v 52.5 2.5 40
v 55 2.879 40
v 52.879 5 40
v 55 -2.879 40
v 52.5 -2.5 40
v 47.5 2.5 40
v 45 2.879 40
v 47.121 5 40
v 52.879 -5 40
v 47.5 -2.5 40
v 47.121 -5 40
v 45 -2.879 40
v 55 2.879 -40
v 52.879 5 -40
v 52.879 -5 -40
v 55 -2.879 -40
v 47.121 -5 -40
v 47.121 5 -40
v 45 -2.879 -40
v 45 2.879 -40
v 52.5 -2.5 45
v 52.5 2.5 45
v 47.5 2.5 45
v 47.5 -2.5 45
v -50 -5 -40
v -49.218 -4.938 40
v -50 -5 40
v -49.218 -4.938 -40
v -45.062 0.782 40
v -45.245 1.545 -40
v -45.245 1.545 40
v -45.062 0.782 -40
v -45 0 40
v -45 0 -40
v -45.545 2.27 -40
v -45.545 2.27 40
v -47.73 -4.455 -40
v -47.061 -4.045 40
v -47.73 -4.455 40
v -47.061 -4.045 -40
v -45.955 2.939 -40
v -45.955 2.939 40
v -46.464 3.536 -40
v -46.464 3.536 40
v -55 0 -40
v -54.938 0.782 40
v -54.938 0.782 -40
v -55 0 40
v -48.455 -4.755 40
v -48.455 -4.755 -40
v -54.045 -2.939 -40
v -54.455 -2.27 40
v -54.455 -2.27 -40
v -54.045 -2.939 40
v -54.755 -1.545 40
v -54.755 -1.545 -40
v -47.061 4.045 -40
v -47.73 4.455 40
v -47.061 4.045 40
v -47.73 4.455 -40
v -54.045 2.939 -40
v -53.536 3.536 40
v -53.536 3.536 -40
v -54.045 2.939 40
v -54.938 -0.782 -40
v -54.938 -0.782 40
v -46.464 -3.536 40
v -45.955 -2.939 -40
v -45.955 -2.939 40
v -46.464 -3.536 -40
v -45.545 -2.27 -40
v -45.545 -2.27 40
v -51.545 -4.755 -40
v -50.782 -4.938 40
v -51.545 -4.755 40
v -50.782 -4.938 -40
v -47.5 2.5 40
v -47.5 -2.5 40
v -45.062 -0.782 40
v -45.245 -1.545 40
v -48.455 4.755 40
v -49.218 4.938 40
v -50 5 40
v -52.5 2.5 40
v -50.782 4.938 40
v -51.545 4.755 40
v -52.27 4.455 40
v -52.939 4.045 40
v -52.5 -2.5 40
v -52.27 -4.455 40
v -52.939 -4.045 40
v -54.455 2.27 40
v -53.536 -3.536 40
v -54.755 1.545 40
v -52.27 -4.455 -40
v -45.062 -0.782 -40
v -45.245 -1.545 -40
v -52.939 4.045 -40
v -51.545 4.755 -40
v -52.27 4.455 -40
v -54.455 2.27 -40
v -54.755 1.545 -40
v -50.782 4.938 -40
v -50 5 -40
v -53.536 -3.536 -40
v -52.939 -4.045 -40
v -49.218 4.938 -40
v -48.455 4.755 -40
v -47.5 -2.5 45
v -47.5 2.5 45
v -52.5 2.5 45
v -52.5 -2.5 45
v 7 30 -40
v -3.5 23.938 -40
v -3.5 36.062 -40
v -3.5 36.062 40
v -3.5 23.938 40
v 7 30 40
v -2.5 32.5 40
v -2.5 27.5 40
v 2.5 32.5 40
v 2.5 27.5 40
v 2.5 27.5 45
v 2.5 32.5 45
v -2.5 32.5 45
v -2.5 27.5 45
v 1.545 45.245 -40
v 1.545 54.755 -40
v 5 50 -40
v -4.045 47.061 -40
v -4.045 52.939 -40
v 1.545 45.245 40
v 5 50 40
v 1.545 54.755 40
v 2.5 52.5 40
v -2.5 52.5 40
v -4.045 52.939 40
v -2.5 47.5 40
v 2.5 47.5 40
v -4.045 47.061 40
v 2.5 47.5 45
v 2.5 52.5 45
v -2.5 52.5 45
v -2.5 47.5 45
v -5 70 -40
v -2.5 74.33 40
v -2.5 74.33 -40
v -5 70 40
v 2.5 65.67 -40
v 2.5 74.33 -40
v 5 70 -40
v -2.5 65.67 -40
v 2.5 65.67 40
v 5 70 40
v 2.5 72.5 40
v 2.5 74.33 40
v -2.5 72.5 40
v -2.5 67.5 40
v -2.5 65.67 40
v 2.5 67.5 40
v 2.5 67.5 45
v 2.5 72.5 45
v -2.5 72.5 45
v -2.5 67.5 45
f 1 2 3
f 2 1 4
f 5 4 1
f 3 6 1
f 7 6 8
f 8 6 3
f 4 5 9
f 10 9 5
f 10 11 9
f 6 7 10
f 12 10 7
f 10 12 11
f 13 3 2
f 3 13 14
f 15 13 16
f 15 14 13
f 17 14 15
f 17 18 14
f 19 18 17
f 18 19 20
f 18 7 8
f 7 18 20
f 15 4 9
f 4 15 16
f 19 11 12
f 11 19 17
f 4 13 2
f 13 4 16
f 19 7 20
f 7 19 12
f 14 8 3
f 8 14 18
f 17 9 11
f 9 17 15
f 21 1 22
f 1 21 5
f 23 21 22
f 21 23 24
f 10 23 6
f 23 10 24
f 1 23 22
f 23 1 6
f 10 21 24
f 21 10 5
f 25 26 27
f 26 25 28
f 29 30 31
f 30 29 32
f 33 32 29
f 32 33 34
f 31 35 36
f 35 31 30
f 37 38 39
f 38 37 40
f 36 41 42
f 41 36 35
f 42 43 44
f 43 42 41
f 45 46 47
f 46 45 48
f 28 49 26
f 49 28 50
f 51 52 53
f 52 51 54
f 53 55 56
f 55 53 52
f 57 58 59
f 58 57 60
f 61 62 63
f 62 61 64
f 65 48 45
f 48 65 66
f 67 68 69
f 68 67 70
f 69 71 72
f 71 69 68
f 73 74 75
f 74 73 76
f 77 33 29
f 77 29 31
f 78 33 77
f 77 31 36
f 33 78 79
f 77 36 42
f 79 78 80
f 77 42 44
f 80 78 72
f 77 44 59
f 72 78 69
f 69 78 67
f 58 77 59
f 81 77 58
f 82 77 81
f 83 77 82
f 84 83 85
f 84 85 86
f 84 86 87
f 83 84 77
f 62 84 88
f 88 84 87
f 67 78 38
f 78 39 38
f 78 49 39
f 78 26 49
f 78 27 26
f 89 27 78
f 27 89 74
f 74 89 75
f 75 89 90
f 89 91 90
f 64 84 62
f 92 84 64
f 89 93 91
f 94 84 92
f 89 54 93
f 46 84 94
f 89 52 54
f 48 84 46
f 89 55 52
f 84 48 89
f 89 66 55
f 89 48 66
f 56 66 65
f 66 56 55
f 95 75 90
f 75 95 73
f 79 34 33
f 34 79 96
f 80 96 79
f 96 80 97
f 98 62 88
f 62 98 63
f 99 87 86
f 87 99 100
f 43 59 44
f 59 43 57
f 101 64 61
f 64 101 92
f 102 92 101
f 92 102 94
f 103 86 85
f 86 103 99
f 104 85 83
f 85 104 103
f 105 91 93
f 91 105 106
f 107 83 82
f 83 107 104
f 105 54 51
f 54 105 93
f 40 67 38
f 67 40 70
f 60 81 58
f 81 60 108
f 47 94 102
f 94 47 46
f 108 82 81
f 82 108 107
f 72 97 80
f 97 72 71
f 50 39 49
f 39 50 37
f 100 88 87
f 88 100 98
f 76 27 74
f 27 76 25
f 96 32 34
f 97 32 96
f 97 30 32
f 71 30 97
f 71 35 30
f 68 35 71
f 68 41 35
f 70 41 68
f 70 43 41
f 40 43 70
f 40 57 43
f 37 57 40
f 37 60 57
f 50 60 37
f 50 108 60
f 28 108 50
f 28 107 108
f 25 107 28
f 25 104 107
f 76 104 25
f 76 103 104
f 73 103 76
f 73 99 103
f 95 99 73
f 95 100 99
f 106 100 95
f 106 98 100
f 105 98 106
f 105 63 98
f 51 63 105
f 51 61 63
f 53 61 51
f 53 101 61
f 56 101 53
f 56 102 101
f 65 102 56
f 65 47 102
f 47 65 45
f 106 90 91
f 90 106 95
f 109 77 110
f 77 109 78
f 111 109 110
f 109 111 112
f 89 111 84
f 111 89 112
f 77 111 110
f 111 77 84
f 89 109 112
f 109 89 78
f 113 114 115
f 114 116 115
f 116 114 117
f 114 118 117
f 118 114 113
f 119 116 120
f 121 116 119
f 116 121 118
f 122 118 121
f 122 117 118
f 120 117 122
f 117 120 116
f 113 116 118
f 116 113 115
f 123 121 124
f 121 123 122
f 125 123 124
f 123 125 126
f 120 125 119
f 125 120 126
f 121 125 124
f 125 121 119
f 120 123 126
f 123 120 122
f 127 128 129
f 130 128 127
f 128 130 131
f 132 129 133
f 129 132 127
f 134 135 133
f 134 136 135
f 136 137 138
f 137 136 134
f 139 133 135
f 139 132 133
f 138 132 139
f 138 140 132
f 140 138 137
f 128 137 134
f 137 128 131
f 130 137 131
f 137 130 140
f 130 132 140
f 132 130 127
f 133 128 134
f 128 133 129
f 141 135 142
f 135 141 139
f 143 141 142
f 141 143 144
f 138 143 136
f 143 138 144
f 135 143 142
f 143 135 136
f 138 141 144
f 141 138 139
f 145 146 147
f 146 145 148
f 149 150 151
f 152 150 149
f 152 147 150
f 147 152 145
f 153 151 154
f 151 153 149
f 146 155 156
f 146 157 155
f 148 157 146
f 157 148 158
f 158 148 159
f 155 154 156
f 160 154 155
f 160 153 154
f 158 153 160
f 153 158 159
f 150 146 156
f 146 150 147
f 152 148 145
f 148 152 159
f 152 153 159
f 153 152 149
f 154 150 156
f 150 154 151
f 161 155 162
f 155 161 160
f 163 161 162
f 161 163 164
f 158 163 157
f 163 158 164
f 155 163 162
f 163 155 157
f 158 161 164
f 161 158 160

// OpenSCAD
$fn=40;

module cut_corners_shaft(width, length) {
  offset = width / 2;
  difference() {
    cube([width,width,length], center=true);
    union() {
      translate([offset,offset,0]) rotate([0,0,45]) cube([3,3,length], center=true);
      translate([-offset,offset,0]) rotate([0,0,45]) cube([3,3,length], center=true);
      translate([offset,-offset,0]) rotate([0,0,45]) cube([3,3,length], center=true);
      translate([-offset,-offset,0]) rotate([0,0,45]) cube([3,3,length], center=true);
    }
  }
  translate([0,0,2.5+length/2]) cube([5,5,5], center=true);
}

module round_shaft(width, length) {
  cylinder(h=length, d=width, center=true);
  translate([0,0,2.5+length/2]) cube([5,5,5], center=true);
}

module polygon_shaft(width, length, sides) {

  linear_extrude(height = length, center = true)
    circle(width,$fn=sides);
  translate([0,0,2.5+length/2]) cube([5,5,5], center=true);
}


/* linear_extrude(height = 5, center = true, convexity = 10)
  translate([-30,-170,0])
  import(file = "button_profile.dxf", convexity=4); */

/* rotate_extrude(angle = 360, convexity = 2)
translate([-30,-170,0])
import(file = "button_profile.dxf"); */

/*
rotate_extrude(angle = 180, convexity = 3)
rotate([0,0,90])
translate([-10,0,0])
import(file = "button_profile.dxf"); */

translate([50,0,0]) cut_corners_shaft(10, 80);
translate([-50,0,0]) round_shaft(10, 80);
translate([0,30,0]) polygon_shaft(7, 80, 3);
translate([0,50,0]) polygon_shaft(5, 80, 5);
translate([0,70,0]) polygon_shaft(5, 80, 6);
